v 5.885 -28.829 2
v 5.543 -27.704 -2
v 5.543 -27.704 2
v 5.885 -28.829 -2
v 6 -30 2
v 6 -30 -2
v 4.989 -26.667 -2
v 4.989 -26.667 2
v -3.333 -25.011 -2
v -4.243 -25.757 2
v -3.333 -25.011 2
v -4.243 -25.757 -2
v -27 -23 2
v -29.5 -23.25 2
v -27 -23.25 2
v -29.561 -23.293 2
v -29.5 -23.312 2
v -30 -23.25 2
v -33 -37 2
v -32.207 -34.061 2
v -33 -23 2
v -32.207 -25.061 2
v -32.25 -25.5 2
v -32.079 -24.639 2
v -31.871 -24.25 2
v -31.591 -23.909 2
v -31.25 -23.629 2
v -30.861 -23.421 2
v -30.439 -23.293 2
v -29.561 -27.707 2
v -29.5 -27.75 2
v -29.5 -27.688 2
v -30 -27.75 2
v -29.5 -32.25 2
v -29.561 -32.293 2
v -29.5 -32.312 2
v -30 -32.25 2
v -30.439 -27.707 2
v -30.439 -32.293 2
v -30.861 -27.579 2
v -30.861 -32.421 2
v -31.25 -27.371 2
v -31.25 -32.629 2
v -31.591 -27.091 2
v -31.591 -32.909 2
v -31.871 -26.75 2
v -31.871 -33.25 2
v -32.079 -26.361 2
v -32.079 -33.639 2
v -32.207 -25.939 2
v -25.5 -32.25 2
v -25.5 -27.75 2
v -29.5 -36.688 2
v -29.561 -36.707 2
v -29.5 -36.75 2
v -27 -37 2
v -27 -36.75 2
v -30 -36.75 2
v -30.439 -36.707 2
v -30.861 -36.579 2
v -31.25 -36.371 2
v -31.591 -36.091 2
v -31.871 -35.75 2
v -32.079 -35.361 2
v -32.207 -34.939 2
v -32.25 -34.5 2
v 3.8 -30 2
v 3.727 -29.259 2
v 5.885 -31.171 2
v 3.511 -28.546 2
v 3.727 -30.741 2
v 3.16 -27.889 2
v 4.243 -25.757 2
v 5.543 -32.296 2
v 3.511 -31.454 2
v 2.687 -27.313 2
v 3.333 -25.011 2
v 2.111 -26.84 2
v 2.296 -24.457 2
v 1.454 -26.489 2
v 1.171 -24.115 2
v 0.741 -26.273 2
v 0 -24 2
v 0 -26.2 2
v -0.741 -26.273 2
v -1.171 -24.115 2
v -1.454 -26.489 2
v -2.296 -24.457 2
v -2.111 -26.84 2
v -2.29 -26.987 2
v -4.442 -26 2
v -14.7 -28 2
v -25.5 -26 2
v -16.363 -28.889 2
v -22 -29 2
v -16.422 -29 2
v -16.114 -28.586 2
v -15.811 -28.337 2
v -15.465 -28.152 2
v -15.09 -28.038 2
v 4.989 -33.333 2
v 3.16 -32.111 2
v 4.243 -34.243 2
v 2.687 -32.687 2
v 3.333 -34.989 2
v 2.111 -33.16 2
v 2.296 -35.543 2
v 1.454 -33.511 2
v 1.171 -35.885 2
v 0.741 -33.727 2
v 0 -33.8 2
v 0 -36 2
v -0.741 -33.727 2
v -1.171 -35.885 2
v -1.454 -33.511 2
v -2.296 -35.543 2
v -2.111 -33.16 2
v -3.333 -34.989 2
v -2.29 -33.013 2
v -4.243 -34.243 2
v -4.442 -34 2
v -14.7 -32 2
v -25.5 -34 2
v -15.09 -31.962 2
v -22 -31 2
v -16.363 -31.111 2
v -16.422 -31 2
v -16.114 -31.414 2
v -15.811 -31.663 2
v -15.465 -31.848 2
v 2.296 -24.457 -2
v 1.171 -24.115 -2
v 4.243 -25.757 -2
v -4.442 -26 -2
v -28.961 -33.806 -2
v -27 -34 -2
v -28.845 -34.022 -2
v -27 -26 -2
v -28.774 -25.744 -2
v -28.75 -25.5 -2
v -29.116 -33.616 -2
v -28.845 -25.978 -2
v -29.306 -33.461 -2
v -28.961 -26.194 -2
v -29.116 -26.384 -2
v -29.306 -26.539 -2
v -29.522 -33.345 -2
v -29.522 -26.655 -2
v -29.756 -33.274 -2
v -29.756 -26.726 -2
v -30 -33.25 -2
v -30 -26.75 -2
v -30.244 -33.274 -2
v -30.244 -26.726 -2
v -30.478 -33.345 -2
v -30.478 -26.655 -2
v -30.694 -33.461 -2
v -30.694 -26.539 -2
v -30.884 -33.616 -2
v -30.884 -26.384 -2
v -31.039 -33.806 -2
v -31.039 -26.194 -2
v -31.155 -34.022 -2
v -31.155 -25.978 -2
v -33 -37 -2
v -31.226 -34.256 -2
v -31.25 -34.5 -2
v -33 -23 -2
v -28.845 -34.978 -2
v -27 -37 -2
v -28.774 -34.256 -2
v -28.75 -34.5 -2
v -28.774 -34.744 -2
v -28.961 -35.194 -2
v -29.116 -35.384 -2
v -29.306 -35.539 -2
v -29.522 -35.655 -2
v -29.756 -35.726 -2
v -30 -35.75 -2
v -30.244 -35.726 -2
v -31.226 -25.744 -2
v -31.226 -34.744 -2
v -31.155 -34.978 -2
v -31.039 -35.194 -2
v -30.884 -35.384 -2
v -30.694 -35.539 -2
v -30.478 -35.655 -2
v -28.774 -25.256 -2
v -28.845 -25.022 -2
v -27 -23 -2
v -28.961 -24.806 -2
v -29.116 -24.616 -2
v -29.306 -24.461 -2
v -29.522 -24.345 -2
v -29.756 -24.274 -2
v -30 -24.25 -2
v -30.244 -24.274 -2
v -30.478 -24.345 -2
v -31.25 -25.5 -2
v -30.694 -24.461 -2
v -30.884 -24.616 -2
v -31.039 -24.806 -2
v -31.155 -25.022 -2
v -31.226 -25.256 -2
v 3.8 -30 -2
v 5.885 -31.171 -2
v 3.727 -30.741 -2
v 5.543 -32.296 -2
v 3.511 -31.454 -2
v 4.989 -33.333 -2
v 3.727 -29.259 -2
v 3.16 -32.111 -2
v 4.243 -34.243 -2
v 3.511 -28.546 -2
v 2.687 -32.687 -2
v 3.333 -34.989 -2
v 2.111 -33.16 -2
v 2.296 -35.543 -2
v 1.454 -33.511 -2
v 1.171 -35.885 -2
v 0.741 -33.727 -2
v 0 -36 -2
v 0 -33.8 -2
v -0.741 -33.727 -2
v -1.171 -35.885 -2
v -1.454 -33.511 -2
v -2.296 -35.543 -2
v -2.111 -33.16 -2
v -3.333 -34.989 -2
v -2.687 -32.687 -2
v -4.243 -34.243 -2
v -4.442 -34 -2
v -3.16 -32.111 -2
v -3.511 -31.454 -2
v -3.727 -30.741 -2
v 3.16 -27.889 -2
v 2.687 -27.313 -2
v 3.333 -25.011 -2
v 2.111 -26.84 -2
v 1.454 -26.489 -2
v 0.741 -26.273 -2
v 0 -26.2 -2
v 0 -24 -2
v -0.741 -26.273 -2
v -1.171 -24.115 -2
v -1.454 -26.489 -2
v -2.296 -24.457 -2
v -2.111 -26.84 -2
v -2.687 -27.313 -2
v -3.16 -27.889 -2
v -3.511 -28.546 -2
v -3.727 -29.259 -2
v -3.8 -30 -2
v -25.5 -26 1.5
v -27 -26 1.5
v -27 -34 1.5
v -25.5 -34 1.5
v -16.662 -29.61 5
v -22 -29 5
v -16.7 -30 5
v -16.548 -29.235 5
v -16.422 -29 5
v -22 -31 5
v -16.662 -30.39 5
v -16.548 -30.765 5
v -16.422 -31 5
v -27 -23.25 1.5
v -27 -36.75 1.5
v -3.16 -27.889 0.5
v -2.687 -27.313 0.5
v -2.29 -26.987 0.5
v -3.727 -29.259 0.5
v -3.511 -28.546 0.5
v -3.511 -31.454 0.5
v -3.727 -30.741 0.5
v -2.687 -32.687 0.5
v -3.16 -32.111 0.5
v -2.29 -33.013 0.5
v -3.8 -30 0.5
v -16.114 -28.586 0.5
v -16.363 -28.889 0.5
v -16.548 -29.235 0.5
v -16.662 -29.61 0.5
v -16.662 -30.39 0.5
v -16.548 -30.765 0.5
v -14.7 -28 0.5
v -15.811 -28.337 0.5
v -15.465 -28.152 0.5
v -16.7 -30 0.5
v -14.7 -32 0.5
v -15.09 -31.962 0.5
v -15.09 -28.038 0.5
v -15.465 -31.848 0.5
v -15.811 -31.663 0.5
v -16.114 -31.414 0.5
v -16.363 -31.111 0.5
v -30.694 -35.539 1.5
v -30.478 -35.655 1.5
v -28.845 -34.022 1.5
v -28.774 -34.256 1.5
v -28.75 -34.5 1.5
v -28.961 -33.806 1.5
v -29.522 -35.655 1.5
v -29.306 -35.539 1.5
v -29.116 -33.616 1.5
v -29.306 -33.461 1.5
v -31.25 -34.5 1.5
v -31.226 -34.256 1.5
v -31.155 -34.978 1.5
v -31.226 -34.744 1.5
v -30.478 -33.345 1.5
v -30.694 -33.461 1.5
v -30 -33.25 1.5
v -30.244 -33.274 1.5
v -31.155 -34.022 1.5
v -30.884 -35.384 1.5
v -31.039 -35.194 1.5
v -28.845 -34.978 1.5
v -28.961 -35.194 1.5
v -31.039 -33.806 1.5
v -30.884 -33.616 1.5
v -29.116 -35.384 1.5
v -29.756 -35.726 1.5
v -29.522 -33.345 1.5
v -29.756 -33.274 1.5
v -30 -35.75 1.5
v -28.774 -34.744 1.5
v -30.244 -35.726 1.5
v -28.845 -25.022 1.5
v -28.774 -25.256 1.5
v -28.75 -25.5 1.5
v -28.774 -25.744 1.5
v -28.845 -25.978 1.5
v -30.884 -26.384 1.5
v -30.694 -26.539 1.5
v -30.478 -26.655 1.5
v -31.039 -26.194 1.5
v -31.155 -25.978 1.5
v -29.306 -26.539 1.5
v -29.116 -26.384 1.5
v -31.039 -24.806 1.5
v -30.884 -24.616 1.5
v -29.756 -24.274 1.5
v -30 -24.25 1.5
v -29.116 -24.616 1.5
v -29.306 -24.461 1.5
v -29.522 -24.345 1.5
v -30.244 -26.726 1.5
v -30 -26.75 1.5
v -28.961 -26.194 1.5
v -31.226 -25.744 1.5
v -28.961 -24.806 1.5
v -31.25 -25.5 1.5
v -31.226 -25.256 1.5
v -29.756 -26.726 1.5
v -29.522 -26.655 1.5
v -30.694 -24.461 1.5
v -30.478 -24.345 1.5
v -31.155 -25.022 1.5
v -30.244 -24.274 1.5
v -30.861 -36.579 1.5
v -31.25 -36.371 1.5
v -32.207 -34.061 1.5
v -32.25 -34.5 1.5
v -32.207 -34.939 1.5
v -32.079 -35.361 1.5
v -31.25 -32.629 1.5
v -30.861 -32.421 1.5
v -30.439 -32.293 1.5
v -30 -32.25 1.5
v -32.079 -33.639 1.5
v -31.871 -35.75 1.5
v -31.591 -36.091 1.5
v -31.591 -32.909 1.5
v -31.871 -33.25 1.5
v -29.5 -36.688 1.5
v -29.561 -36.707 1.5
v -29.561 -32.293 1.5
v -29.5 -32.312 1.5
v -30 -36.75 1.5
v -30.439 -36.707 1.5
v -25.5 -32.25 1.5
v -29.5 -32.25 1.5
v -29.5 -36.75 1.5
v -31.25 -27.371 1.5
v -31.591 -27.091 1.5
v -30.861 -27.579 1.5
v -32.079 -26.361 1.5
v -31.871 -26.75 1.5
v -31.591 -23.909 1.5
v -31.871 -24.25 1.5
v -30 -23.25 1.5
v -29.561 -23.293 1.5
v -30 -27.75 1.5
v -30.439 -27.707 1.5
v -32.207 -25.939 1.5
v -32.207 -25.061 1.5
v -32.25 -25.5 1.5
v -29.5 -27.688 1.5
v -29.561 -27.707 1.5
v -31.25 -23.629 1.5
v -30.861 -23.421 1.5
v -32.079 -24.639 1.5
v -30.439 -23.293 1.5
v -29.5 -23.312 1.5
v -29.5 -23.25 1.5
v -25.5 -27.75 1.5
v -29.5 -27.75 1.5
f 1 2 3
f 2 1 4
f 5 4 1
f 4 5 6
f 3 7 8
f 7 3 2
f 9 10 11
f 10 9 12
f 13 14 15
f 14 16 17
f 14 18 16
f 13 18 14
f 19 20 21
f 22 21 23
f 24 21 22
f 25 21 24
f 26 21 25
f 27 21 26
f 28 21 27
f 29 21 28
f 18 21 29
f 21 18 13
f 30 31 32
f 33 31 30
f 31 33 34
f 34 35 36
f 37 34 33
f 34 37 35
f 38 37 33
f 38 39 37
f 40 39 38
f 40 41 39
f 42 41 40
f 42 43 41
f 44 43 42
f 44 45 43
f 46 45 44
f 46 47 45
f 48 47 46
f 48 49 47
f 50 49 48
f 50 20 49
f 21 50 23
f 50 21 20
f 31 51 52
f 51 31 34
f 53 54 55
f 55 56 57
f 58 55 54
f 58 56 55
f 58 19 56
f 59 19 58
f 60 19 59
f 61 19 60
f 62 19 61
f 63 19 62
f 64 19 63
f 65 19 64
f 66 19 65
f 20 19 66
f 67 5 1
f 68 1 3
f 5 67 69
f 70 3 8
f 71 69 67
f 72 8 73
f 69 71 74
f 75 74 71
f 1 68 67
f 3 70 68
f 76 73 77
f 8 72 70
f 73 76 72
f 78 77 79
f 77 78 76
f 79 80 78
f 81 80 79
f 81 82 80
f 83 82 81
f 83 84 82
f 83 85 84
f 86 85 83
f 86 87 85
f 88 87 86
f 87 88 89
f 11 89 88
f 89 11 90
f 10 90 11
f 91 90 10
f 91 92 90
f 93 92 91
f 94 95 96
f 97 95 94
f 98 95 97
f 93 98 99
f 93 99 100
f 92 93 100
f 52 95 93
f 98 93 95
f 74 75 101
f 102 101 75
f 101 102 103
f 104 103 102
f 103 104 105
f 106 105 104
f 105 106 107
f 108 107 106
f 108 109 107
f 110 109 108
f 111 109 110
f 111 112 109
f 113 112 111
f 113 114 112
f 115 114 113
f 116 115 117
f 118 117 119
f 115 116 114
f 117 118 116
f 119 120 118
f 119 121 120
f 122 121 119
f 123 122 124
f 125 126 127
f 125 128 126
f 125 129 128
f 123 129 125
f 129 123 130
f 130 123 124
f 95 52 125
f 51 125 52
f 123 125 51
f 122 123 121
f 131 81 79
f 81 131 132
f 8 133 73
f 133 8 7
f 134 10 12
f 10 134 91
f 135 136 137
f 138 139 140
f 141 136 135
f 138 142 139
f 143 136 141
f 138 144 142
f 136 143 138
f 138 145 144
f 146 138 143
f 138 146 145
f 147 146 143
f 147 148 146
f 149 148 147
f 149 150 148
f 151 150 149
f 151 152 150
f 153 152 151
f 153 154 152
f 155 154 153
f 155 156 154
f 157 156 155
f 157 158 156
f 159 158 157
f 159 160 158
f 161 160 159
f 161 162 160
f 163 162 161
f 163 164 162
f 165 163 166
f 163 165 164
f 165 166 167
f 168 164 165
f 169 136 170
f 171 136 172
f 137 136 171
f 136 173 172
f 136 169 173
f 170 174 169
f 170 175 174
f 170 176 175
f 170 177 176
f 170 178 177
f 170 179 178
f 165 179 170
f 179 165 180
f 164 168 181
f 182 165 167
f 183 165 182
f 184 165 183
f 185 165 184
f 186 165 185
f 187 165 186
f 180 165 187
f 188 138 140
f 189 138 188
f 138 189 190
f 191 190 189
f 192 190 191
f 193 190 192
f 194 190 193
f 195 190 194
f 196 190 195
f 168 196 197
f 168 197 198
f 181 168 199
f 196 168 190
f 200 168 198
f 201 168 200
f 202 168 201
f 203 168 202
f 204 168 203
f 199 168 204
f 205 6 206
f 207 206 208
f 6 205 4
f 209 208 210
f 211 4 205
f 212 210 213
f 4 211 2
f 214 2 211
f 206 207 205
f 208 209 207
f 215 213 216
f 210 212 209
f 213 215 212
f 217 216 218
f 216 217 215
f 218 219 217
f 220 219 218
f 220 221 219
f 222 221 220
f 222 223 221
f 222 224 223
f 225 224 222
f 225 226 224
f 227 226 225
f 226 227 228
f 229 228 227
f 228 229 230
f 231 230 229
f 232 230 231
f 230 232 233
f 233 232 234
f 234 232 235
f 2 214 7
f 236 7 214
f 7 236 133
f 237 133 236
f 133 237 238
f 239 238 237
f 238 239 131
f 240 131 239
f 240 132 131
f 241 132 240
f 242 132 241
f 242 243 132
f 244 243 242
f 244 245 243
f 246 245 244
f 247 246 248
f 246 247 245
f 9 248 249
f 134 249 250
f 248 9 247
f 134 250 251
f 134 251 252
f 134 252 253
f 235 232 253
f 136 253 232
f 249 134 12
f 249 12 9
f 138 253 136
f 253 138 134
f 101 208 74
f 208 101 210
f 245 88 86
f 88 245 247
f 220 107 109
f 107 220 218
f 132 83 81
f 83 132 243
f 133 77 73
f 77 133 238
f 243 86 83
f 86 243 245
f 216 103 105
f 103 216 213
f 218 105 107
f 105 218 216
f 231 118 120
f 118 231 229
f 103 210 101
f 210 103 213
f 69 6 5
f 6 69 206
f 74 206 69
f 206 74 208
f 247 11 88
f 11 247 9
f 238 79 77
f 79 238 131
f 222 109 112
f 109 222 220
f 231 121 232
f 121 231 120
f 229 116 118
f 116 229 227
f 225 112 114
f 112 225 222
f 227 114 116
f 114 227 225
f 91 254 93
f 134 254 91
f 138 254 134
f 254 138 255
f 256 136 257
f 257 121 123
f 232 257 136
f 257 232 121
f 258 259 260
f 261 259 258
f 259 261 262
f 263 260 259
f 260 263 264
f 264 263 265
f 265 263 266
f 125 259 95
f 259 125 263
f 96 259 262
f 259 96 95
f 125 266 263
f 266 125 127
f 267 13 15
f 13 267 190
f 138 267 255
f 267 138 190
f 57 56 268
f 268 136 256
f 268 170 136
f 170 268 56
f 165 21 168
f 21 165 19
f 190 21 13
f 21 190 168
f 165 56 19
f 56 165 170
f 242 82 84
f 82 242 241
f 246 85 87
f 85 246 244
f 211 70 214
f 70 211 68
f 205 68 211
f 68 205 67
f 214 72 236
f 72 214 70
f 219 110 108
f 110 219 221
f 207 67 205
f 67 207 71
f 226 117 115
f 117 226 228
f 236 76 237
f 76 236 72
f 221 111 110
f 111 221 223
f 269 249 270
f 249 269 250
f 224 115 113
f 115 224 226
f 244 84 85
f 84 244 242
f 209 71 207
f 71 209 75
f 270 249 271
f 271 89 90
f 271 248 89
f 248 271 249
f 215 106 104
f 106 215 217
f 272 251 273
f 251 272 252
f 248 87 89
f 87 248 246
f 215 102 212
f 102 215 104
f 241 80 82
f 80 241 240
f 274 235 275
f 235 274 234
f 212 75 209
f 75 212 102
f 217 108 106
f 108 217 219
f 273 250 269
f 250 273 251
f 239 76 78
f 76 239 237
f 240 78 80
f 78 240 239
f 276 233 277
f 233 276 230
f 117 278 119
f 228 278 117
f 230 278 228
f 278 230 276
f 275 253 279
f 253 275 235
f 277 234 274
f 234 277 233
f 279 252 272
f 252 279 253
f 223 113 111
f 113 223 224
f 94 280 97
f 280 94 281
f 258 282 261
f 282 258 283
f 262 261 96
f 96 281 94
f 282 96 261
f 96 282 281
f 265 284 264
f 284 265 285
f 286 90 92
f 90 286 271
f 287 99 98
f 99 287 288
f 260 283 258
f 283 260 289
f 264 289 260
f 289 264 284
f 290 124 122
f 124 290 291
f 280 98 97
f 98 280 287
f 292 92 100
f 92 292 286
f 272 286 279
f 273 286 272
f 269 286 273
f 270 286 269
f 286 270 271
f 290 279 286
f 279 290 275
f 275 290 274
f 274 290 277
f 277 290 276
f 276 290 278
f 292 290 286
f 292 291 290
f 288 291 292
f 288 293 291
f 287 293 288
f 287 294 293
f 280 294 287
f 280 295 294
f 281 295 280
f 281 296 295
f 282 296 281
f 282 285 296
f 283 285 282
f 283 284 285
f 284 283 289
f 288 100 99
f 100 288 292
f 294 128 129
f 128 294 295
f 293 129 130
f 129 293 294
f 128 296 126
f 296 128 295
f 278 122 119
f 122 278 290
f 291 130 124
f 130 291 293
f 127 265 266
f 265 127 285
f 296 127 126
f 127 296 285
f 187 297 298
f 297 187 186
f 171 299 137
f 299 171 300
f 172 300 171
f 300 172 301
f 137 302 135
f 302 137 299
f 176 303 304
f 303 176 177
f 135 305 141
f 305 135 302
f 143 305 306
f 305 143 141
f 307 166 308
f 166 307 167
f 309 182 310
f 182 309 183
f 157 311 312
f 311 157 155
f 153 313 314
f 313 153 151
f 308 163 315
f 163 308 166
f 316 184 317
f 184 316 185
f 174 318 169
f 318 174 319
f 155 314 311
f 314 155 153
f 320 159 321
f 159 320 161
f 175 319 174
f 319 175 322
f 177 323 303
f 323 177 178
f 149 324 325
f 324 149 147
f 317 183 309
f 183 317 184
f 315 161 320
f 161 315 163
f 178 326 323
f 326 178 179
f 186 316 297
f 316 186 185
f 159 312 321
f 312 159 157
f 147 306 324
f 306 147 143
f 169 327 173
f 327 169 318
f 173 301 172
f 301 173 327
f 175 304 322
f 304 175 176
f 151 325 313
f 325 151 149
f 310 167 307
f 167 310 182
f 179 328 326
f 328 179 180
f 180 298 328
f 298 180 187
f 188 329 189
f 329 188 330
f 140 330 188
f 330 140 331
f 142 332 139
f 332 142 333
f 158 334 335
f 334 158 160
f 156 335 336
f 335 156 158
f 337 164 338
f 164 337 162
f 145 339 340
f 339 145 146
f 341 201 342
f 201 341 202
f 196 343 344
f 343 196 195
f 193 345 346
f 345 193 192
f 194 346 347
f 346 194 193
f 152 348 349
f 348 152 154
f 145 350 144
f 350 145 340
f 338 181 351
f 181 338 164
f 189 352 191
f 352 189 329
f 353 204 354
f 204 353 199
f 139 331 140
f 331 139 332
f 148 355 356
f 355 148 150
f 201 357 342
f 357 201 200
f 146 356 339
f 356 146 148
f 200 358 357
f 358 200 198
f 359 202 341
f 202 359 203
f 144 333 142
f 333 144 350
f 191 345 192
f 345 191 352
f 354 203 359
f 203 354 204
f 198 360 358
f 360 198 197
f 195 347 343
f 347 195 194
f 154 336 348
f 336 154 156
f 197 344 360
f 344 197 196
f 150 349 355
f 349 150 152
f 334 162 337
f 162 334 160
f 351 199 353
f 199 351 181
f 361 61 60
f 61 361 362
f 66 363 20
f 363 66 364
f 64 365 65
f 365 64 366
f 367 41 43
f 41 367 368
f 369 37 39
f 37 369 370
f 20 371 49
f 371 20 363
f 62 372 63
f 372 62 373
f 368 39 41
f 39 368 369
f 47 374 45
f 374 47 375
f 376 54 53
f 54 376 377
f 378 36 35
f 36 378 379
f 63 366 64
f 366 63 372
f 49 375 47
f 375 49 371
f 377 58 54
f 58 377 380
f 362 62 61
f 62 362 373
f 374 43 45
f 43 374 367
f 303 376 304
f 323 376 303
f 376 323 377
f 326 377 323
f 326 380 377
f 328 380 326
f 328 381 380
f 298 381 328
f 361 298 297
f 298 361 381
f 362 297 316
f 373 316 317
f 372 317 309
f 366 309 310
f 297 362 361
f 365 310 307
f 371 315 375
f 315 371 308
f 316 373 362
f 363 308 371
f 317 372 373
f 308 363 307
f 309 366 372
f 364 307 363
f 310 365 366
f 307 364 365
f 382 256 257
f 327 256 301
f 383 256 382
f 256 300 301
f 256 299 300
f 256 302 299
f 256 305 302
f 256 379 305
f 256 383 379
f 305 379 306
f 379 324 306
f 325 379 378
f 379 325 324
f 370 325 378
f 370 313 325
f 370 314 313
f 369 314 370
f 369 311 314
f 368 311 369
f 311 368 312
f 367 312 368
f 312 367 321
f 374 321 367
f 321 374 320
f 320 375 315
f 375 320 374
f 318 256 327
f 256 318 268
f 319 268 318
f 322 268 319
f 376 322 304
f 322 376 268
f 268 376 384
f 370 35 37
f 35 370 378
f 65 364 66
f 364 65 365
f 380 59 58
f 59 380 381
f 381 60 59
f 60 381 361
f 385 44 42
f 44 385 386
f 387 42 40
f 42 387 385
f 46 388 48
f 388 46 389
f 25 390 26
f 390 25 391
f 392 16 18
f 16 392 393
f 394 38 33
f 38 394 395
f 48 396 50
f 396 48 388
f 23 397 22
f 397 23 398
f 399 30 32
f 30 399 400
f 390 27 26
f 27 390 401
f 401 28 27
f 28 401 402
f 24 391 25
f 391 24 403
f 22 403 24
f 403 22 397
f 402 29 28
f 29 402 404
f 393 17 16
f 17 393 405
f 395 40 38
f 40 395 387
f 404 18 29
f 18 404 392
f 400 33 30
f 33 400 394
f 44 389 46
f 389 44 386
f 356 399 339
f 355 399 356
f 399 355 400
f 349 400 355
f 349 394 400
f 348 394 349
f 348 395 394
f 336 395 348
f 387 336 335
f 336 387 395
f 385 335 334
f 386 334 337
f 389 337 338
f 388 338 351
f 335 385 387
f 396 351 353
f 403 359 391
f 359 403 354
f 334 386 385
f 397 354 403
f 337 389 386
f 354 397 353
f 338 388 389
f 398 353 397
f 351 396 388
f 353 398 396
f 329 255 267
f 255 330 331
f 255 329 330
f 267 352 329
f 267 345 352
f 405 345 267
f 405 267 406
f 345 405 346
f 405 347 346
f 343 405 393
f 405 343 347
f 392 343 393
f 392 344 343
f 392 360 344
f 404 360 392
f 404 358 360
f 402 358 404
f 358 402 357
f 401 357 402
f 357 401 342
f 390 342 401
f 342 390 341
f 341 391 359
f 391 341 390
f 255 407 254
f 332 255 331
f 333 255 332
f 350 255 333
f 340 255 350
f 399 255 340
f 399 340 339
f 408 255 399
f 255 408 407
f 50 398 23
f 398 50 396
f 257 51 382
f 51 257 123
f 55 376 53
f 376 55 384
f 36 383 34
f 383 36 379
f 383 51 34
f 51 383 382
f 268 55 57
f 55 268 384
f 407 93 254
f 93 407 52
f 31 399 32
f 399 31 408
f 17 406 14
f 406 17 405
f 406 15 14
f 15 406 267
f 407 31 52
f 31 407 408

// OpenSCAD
//-- limit switch holder / servo arm extender for Auto Bed Leveling
//-- by AndrewBCN - Barcelona, Spain - November 2014
//-- GPLV3
//-- (armv3 below)

//-- remix of Thingiverse #167430 (armv1 below)
//-- by zennmaster

//-- remix of Thingiverse #209384 (armv2 below)
//-- by Stephen Castello

//--remix of Thingiverse #573181 (Added switch_holes and diameter variable to allow for different-size switches)
//-- by Atrixium

// Some measurements and features

// armv1 has a (fixed) length of 37mm,
// width is 10mm, thickness is 4mm,
// uses 2 x M2.5 screws and nuts to hold a small limit switch.
// Uses standard 9G microservo.

// armv2 is for a much larger limit switch and also
// apparently for a larger servo, although everything seems
// to be configurable. Default thickness is 5mm.
// Uses M3 screws and nuts to hold the limit switch.

// armv3 has a parametric length (default is 37mm), uses
// a T-profile with 4mm base thickness to avoid flexing,
// holds the small limit switch with either 2 x small M2.5
// screws and nuts or a nylon tie.
// Uses standard 9G microservo.
// The slot for the servo arm is properly shaped.


// arm body length, add approximately 8mm for total length
// i.e. with an arm length of 37mm, the distance between
// the servo center and the tip of the limit switch is 45mm

// Configure according to your extruder dimensions
arm_length=30; // [30:70]
// Limit switch hole spacing between centers
switch_holes=9; //[1:15]
// Limit switch hole diameter
diameter=2.5; //[0:4]

module armv3() {
    difference() {
      // body
      union() {
      cylinder(r=6, h=4,center=true,$fn=32);
      translate([-arm_length/2,0,0]) cube([arm_length,8,4],center=true);
      // reinforcement
      translate([-arm_length/2,0,3]) cube([arm_length-16,2,4],center=true);
      // limit switch base
      translate([-arm_length,0,0]) cube([6,5+switch_holes,4],center=true);
      }
      
    // hole for servo spindle
    cylinder(r=3.8,h=10,center=true,$fn=32); 

    // slot for servo arm
    hull() {
      translate([0,0,5.5]) cylinder(r=3.2,h=10,center=true,$fn=32);
      translate([-14.7,0,5.5]) cylinder(r=2,h=10,center=true,$fn=32);
    }
    
    // holes for nylon tie or M2.5 screws holding limit switch
    translate([-arm_length,switch_holes/-2,0]) cylinder(r=diameter/2,h=10,center=true,$fn=32);
    translate([-arm_length,switch_holes/2,0]) cylinder(r=diameter/2,h=10,center=true,$fn=32);
    
    // some limit switches will fit better with this
    translate([-arm_length,switch_holes/-2,4]) cylinder(r=diameter/2+1,h=5,center=true,$fn=32);
    translate([-arm_length,switch_holes/2,4]) cylinder(r=diameter/2+1,h=5,center=true,$fn=32);    
    translate([-arm_length+2.5,switch_holes/-2,4]) cube([4,diameter+2,5],center=true);
    translate([-arm_length+2.5,switch_holes/2,4]) cube([4,diameter+2,5],center=true);    
    }
}


module armv1() {
  difference(){
    union(){
      difference(){
	roundedBox([10,37,4],4,true); //main body
	translate([0,0,3])
	  roundedBox([4.8,28,5],2.4,true);  //slot for servo arm
	translate([0,-12.5,-5])
	cylinder(r=3.75,h=10, $fn=30); //  Hole for servo spindle
      }

      translate([0,16.5,0])
      roundedBox([20,5,4],1.75,true); // Microswtich mount body
    }
    translate([0,16.5,-1])
    roundedBox([16,2.8,10],1.4,true);  // slot for mounting screws
  }
}

module armv2() {
  //////////////////////////////////////////////////////////////////////////////////////////////////
  // Created on 12/13/2013 by Stephen Castello
  // Last update: 2/22/2014
  // changed thickness to 5mm (4mm flexed alot)
  //////////////////////////////////////////////////////////////////////////////////////////////////
  // variables
  //////////////////////////////////////////////////////////////////////////////////////////////////
  Z_Rod_dia=10;				// diameter of Z rod
  Screw_dia=3.2;				// clamp screw diameter
  Screw_Thread_dia=2.5;		// screw hole diameter to make a 3mm threaded hole
  Switch_ht=15;				// height of holder
  Switch_thk = 5;				// thickness of holder
  Switch_hole_sep=22;		// distance between holes for switch (19 for mechanical endstop v1.2)
  Switch_hole_offset = 10;		// switch hole offest (mech endstop v1.2 doesn't have one)
  Nut_wrench_size = 5.5;		// wrench size of nut
  Nut_depth = 2.3;			// thickness of nut
  Nylok_depth = 4;			// thickness of nylok nut
  Lever_wd = 12;				// width of lever
  Lever_ht = 33;				// lever length
  Servo_dia = 8.2;			// outside diameter of servo lever
  //////////////////////////////////////////////////////////////////////////////////////////////////
  // make the parts
  //////////////////////////////////////////////////////////////////////////////////////////////////

  rotate([0,-90,0]) {
	  switch_side(0); // switch off to right == 1
	  lever();
  }

  //////////////////////////////////////////////////////////////////////////////////////////////////
  // modules for each part
  //////////////////////////////////////////////////////////////////////////////////////////////////

  module switch_side(Right) { // riser for switch
	  if(Right) {
		  difference() {
			  difference() {
				  difference() {
					  cube([Switch_thk,29,Switch_ht],false);
					  // screw holes for switch
					  rotate(a=[0,90,0]) {		
						  translate([-(Switch_ht-2.5), 4, 0]) {
							  cylinder(h = 11, r = Screw_dia/2, center = false, $fn=100);
						  }
					  }
					  rotate(a=[0,90,0]) {
						  translate(v = [-(Switch_ht-2.5)+Switch_hole_offset, 4+Switch_hole_sep, 0]) {
						  cylinder(h = 11, r = Screw_dia/2, center = false, $fn=100);
						  }
					  }
				  }
			  }
		  }
		  translate([0,12,11]) rotate([45,0,0]) cube([Switch_thk,5,5],false); // gusset
	  } else {
		  difference() {
			  difference() {
				  translate([0,-17,0]) {
					  difference() {
						  cube([Switch_thk,29,Switch_ht],false);
						  // screw holes for switch
						  rotate(a=[0,90,0]) {		
							  translate([-(Switch_ht-2.5)+Switch_hole_offset, 4, 0]) {
								  cylinder(h = 11, r = Screw_dia/2, center = false, $fn=100);
							  }
						  }
						  rotate(a=[0,90,0]) {
							  translate(v = [-(Switch_ht-2.5), 4+Switch_hole_sep, 0]) {
							  cylinder(h = 11, r = Screw_dia/2, center = false, $fn=100);
							  }
						  }
					  }
				  } // translate
			  }
		  }
		  translate([0,0,11]) rotate([45,0,0]) cube([Switch_thk,5,5],false); // gusset
	  }
  }

  //////////////////////////////////////////////////////////////////////////////////////////////////////////////

  module lever() {  // servo lever
	  difference() {
		  hull() {
			  translate([0,0,15]) cube([Switch_thk,Lever_wd,Lever_ht-5],false); // lever with a rounded end
			  translate([0,6,Lever_ht + 10.5]) rotate([0,90,0]) cylinder(h=Switch_thk,r=Lever_wd/2,$fn=50);
		  }
		  translate([2.6,3,15]) cube([Switch_thk/2,Lever_wd/2,Lever_ht-5],false); // groove
		  translate([-5,6,Lever_ht + 10]) rotate([0,90,0]) cylinder(h=20,r=Servo_dia/2,$fn=50); // servo arm hole
		  //notch_lever();  // added countersinks instead
	  }
  }

  //////////////////////////////////////////////////////////////////////////////////////////////////////////////

  module notch_lever()
  {
	  difference() { // space for servo mounting screw
		  hull() {   // must be adjusted if size is changed *************************************************************
			  translate([-1,15,35]) rotate([90,0,0]) cylinder(h=20,r=2,$fn=50);
			  translate([-1,23,50]) rotate([135,0,0]) cylinder(h=20,r=2,$fn=50);
			  translate([-1,3,36]) rotate([45,0,0]) cylinder(h=20,r=2,$fn=50);
		  }
		  translate([-1,6,47]) {
			  rotate([0,90,0]) minkowski() {
				  cube([Lever_wd-4,Switch_thk-4,Lever_ht], true);
				  cylinder(r=6,h=1,$fn=100);
			  }
		  }
	  }
  }

  //////////////////////end of Z stop servo mount.scad /////////////////////////////////////////////////
}

/*include <boxes.scad>; // required only by armv1
armv1();
translate([30,30,0]) armv2(); */
// print the part
translate([0,-30,0]) armv3();
